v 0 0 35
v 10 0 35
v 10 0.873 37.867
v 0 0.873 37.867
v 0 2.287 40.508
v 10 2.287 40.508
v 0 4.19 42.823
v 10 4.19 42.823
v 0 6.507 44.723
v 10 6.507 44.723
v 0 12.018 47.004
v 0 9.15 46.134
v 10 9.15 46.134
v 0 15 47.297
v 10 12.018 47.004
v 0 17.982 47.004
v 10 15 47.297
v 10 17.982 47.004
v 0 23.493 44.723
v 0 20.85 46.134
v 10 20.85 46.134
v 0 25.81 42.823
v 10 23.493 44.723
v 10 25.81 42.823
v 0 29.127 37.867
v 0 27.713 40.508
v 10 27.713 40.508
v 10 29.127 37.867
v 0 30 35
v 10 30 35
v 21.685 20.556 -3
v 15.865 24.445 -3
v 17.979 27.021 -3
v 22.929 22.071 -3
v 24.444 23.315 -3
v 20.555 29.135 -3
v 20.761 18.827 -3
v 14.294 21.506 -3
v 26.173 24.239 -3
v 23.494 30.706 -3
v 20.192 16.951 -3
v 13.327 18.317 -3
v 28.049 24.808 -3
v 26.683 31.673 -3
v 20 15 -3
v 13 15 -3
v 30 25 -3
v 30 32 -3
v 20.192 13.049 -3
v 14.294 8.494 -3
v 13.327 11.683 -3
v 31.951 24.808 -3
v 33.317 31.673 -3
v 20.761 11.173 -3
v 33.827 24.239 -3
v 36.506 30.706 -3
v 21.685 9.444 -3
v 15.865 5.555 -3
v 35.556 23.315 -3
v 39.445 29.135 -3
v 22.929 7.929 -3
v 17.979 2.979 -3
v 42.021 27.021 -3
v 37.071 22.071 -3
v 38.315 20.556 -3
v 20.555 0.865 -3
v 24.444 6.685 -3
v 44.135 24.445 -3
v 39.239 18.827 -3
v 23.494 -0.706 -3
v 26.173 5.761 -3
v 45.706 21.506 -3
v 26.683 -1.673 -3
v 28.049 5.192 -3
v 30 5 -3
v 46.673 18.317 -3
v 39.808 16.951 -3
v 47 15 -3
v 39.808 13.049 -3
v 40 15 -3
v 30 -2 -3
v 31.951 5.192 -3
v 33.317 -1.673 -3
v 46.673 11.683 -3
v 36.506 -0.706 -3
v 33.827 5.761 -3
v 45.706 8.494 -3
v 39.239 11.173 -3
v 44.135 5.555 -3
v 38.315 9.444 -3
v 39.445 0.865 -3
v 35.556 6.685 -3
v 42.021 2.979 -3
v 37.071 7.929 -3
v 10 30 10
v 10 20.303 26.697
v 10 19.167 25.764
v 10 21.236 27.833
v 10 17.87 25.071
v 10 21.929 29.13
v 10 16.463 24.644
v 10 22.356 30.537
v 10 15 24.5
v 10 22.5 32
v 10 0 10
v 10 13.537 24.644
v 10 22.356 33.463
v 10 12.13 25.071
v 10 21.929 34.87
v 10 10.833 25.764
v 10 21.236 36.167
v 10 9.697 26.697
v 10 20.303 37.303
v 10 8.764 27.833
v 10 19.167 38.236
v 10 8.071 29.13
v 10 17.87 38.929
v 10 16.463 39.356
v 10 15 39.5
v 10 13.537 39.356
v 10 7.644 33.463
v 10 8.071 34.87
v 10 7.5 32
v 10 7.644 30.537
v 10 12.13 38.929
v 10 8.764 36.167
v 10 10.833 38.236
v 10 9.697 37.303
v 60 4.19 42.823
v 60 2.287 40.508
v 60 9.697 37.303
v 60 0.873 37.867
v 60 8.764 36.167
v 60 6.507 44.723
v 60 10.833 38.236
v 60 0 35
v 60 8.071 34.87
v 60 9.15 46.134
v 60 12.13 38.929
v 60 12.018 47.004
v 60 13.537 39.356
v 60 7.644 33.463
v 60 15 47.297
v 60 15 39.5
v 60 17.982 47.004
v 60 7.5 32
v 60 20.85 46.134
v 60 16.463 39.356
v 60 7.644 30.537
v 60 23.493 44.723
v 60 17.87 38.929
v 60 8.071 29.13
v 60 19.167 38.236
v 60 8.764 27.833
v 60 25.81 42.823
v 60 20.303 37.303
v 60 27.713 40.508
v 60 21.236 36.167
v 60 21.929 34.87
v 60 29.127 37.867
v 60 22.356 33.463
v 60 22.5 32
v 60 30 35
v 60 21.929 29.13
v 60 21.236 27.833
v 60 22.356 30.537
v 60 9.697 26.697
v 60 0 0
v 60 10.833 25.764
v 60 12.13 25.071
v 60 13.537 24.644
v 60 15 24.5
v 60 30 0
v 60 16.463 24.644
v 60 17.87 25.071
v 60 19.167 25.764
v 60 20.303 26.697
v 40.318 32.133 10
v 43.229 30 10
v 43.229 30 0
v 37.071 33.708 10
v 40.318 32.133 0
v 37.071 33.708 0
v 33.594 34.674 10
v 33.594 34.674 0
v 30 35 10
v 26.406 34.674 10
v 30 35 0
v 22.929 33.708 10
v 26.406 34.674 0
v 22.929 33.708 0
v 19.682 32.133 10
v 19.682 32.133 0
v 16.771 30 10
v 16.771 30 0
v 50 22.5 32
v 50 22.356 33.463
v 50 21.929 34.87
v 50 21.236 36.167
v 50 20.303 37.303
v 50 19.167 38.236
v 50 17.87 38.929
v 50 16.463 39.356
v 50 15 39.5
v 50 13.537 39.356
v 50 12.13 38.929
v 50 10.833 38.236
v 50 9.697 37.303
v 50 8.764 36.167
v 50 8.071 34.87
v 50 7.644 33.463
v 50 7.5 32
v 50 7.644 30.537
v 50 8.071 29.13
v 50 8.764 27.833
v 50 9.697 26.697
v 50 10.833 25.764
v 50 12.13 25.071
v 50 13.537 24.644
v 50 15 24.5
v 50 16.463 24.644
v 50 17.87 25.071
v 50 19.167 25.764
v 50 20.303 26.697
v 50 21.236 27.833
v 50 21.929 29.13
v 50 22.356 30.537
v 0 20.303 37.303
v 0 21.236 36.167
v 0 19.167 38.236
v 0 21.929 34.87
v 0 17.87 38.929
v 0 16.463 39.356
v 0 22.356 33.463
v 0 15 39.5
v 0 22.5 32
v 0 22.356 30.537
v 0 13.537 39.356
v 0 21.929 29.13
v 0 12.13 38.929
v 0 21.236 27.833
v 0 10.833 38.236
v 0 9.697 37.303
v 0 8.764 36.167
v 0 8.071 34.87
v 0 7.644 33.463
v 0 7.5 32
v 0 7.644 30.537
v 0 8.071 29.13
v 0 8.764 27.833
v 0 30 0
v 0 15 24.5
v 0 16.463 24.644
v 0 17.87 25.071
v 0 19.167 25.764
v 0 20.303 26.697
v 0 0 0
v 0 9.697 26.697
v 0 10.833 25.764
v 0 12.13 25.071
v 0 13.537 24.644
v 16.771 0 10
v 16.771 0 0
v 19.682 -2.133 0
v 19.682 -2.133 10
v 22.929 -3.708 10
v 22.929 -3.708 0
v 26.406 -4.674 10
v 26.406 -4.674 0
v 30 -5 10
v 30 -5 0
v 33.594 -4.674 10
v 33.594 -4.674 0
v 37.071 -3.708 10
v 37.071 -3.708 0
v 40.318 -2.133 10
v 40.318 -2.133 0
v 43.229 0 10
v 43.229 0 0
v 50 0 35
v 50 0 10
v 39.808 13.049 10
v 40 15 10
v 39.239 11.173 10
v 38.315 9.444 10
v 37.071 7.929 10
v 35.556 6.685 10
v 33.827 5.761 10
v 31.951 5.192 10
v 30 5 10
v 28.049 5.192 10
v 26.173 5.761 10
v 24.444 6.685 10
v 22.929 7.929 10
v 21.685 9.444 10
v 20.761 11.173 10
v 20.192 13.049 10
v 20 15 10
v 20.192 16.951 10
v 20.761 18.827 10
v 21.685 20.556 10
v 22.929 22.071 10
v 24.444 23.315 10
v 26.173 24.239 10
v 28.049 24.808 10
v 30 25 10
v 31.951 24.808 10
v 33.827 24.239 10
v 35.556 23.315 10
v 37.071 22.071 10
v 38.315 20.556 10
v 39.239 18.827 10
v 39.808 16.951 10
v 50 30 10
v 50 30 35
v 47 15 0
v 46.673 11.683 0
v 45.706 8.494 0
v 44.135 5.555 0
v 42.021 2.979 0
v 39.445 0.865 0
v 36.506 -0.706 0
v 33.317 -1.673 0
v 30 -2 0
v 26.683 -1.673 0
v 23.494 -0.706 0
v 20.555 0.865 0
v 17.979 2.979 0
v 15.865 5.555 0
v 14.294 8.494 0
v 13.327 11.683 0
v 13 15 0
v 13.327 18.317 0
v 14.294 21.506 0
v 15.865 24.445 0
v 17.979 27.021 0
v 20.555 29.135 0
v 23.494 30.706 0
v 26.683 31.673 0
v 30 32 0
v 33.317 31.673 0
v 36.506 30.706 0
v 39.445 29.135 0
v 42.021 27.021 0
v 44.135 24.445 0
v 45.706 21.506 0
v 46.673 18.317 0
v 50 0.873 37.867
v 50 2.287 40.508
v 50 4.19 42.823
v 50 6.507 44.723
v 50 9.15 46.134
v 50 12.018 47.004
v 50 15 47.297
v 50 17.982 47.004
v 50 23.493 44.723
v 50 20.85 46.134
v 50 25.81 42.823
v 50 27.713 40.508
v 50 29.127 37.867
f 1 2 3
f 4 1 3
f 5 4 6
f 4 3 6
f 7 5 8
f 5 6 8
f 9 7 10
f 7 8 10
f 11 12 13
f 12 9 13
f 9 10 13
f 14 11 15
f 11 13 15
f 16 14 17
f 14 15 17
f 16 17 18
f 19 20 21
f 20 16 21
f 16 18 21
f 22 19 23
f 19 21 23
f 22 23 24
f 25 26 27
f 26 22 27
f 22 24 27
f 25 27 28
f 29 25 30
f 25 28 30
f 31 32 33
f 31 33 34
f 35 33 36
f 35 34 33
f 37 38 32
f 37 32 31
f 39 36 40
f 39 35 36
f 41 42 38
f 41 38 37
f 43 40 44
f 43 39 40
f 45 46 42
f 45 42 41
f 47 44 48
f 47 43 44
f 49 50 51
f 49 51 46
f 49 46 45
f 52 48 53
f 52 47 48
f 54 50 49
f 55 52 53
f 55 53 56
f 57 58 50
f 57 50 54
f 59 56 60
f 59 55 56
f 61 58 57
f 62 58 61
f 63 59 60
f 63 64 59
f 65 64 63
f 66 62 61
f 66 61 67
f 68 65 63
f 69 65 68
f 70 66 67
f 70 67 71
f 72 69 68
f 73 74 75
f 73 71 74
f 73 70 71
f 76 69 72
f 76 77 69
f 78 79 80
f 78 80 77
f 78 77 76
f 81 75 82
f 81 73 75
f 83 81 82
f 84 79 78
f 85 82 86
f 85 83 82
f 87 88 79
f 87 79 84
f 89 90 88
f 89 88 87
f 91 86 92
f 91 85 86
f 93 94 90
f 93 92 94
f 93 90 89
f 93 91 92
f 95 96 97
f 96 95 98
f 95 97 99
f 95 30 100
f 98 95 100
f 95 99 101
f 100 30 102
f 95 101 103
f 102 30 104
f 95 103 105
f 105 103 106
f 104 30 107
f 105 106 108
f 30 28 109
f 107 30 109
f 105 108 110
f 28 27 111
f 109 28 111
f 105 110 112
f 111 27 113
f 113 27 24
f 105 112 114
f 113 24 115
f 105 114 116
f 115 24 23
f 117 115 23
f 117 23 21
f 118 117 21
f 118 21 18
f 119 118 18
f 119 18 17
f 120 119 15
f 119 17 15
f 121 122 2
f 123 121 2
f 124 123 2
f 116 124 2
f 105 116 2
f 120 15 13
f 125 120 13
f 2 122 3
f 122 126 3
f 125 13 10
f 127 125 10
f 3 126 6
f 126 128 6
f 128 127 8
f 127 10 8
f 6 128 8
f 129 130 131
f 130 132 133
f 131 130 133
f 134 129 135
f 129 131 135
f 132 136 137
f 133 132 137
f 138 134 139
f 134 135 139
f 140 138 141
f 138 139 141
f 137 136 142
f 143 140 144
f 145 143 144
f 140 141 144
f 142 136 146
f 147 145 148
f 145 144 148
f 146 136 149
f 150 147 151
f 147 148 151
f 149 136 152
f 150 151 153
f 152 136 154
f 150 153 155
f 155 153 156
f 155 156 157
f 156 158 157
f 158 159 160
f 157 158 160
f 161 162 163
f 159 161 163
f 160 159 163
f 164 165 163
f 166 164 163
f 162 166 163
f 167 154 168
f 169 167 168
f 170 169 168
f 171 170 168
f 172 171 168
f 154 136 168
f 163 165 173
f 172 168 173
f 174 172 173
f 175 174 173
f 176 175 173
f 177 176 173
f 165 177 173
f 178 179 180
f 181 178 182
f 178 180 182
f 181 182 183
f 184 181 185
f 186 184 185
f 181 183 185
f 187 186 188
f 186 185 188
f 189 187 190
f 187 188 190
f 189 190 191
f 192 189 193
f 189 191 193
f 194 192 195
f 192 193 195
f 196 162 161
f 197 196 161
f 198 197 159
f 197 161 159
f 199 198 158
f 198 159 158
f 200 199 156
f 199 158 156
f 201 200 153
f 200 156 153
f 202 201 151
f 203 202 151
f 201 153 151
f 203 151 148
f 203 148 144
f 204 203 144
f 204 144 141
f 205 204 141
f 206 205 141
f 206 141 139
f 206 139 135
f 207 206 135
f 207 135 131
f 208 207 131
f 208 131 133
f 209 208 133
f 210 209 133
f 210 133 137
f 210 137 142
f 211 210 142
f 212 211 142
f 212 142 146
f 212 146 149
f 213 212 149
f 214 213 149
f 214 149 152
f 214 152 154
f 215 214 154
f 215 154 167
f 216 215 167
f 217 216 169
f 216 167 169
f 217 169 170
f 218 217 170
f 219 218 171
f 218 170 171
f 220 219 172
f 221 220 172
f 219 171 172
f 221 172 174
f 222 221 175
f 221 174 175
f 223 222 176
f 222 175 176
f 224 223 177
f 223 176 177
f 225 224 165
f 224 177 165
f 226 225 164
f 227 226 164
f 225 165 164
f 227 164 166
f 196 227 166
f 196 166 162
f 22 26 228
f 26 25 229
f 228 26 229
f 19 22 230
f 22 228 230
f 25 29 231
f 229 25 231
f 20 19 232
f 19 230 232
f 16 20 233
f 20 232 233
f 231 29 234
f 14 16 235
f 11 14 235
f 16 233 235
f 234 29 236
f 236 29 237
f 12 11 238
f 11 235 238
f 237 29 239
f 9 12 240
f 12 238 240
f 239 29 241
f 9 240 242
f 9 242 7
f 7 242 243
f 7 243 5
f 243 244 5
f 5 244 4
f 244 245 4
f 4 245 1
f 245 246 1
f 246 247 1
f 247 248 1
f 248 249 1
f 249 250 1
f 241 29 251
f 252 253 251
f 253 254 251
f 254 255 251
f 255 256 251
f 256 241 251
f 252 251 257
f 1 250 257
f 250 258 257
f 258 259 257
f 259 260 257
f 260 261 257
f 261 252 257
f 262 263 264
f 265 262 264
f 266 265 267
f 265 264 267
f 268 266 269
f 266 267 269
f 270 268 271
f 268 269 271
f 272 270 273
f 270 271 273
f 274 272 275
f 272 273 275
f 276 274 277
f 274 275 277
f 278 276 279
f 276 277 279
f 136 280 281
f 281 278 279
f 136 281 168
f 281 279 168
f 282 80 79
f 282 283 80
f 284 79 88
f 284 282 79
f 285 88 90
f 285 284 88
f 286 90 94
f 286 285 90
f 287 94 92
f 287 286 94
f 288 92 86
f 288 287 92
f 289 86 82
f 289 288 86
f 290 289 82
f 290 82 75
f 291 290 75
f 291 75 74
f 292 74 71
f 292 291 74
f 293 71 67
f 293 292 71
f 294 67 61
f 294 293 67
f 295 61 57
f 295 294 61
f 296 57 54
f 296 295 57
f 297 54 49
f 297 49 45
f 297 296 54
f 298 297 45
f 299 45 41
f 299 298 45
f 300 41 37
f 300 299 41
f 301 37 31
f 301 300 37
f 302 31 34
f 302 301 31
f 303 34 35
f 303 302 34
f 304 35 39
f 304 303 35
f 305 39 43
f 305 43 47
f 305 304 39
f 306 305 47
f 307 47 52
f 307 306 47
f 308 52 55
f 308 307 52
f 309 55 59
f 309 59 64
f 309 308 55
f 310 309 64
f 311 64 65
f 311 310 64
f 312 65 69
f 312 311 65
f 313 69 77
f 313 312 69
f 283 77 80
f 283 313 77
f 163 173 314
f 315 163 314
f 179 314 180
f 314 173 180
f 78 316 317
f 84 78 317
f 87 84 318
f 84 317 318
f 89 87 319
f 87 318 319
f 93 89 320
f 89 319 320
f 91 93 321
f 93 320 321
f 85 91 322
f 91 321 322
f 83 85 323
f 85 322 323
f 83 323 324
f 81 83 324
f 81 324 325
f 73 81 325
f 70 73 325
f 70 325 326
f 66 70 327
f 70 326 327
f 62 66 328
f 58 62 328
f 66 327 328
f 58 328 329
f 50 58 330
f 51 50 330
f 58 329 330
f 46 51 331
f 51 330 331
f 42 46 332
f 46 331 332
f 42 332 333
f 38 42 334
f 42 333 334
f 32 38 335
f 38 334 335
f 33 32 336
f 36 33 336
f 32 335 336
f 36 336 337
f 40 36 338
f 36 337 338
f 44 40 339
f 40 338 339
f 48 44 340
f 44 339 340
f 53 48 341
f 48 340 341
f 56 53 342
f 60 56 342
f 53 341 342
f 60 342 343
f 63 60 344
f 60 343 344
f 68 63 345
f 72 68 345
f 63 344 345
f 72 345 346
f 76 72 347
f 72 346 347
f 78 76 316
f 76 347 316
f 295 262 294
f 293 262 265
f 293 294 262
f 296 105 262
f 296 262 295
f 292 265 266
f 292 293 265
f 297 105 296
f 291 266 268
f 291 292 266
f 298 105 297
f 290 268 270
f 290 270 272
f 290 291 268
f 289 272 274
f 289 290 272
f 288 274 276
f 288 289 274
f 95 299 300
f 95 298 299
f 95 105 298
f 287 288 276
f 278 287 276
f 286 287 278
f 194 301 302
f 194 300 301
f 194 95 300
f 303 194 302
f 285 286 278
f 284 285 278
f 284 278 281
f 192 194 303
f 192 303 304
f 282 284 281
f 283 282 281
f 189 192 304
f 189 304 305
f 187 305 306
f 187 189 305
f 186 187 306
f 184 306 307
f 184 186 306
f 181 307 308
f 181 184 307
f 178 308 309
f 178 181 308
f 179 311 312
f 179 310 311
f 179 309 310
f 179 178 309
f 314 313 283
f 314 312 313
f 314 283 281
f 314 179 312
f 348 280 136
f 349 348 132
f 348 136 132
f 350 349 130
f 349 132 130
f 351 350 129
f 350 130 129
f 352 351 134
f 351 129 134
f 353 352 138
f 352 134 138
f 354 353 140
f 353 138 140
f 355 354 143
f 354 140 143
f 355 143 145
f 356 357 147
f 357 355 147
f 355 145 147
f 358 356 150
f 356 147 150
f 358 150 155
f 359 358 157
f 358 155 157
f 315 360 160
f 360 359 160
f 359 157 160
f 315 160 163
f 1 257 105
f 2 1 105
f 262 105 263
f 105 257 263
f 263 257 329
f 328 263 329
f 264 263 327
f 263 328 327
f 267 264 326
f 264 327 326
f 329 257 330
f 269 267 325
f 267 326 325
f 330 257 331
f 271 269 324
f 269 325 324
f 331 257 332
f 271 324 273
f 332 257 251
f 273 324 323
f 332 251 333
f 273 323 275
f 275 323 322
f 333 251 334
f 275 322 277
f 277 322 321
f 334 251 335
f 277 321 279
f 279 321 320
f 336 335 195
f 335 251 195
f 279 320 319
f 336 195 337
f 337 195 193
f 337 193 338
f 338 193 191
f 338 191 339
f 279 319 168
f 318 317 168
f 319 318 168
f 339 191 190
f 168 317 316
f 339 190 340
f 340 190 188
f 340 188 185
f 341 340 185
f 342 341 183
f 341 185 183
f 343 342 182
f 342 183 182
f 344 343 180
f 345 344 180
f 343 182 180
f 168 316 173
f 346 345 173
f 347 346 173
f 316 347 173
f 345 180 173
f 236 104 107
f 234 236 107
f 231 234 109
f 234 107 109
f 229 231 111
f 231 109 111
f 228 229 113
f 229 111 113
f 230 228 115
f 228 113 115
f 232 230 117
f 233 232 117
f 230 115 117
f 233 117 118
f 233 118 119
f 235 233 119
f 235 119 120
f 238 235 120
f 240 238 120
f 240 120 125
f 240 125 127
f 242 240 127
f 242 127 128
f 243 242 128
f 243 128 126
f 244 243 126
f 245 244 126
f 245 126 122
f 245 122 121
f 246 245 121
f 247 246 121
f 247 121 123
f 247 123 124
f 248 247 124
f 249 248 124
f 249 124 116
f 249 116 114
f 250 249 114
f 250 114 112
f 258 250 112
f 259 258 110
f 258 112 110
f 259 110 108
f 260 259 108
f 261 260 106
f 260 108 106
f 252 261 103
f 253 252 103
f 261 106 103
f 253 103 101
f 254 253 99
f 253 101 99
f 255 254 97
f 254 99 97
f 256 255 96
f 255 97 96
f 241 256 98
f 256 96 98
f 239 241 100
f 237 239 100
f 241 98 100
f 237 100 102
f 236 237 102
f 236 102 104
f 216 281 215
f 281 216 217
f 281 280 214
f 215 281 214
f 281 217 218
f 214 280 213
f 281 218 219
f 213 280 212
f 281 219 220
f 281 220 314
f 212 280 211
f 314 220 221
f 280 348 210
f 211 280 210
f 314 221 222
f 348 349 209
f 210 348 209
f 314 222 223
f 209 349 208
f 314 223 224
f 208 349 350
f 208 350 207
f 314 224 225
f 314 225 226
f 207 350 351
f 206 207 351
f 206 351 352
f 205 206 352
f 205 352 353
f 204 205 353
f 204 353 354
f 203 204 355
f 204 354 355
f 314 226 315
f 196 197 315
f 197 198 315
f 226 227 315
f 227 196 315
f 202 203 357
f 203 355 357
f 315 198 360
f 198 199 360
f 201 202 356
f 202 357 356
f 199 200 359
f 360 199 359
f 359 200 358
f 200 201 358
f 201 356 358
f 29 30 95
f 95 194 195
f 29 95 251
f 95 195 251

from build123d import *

# Parameters (mm, degrees)
F0_R     = 10
F1_DEPTH = 50
F2_R     = 10
F3_DEPTH = 40
F4_R     = 7.5
F5_DEPTH = 60.001
F6_R     = 17
F6_R_2   = 10
F7_DEPTH = 3


with BuildPart() as f1:
    # F0 (on Top) → F1 (new body)
    with BuildSketch(Plane.XY):
        with BuildLine():
            Line((43.2287565553, 0), (16.7712434447, 0))
            ThreePointArc((16.7712434447, 0), (30, -5), (43.2287565553, 0))
        make_face()
        Polygon((0, 30), (0, 0), (16.7712434447, 0), (43.2287565553, 0), (60, 0), (60, 30), (43.2287565553, 30), (16.7712434447, 30), align=None)
        with Locations((30, 15)):
            Circle(F0_R, mode=Mode.SUBTRACT)
        with BuildLine():
            ThreePointArc((43.2287565553, 30), (30, 35), (16.7712434447, 30))
            Line((16.7712434447, 30), (43.2287565553, 30))
        make_face()
    extrude(amount=F1_DEPTH)

    # F2 (on face) → F3 (cut)
    with BuildSketch(Plane.XY.offset(50)):
        with BuildLine():
            ThreePointArc((43.2287565553, 30), (37.0710678119, 33.7082869339), (30, 35))
            ThreePointArc((30, 35), (22.9289321881, 33.7082869339), (16.7712434447, 30))
            Line((16.7712434447, 30), (10, 30))
            Line((10, 30), (10, 0))
            Line((10, 0), (16.7712434447, 0))
            ThreePointArc((16.7712434447, 0), (22.9289321949, -3.7082869364), (30.0000000144, -5))
            ThreePointArc((30.0000000144, -5), (37.0710678186, -3.7082869313), (43.2287565553, 0))
            Line((43.2287565553, 0), (50, 0))
            Line((50, 0), (50, 30))
            Line((50, 30), (43.2287565553, 30))
        make_face()
        with Locations((30, 15)):
            Circle(F2_R, mode=Mode.SUBTRACT)
    extrude(amount=-F3_DEPTH, mode=Mode.SUBTRACT)

    # F4 (on face) → F5 (cut, through all)
    with BuildSketch(Plane.YZ.offset(60)):
        with BuildLine():
            Line((30, 50), (0, 50))
            Line((0, 50), (0, 35))
            ThreePointArc((0, 35), (15, 47.2970585408), (30, 35))
            Line((30, 35), (30, 50))
        make_face()
        with Locations((15, 32)):
            Circle(F4_R)
    extrude(amount=-F5_DEPTH, mode=Mode.SUBTRACT)

    # F6 (on face) → F7 (join)
    with BuildSketch(Plane(origin=(0, 0, 0), x_dir=(1, 0, 0), z_dir=(0, 0, -1))):
        with Locations((30, -15)):
            Circle(F6_R)
        with Locations((30, -15)):
            Circle(F6_R_2, mode=Mode.SUBTRACT)
    extrude(amount=F7_DEPTH)


solid = f1.part
